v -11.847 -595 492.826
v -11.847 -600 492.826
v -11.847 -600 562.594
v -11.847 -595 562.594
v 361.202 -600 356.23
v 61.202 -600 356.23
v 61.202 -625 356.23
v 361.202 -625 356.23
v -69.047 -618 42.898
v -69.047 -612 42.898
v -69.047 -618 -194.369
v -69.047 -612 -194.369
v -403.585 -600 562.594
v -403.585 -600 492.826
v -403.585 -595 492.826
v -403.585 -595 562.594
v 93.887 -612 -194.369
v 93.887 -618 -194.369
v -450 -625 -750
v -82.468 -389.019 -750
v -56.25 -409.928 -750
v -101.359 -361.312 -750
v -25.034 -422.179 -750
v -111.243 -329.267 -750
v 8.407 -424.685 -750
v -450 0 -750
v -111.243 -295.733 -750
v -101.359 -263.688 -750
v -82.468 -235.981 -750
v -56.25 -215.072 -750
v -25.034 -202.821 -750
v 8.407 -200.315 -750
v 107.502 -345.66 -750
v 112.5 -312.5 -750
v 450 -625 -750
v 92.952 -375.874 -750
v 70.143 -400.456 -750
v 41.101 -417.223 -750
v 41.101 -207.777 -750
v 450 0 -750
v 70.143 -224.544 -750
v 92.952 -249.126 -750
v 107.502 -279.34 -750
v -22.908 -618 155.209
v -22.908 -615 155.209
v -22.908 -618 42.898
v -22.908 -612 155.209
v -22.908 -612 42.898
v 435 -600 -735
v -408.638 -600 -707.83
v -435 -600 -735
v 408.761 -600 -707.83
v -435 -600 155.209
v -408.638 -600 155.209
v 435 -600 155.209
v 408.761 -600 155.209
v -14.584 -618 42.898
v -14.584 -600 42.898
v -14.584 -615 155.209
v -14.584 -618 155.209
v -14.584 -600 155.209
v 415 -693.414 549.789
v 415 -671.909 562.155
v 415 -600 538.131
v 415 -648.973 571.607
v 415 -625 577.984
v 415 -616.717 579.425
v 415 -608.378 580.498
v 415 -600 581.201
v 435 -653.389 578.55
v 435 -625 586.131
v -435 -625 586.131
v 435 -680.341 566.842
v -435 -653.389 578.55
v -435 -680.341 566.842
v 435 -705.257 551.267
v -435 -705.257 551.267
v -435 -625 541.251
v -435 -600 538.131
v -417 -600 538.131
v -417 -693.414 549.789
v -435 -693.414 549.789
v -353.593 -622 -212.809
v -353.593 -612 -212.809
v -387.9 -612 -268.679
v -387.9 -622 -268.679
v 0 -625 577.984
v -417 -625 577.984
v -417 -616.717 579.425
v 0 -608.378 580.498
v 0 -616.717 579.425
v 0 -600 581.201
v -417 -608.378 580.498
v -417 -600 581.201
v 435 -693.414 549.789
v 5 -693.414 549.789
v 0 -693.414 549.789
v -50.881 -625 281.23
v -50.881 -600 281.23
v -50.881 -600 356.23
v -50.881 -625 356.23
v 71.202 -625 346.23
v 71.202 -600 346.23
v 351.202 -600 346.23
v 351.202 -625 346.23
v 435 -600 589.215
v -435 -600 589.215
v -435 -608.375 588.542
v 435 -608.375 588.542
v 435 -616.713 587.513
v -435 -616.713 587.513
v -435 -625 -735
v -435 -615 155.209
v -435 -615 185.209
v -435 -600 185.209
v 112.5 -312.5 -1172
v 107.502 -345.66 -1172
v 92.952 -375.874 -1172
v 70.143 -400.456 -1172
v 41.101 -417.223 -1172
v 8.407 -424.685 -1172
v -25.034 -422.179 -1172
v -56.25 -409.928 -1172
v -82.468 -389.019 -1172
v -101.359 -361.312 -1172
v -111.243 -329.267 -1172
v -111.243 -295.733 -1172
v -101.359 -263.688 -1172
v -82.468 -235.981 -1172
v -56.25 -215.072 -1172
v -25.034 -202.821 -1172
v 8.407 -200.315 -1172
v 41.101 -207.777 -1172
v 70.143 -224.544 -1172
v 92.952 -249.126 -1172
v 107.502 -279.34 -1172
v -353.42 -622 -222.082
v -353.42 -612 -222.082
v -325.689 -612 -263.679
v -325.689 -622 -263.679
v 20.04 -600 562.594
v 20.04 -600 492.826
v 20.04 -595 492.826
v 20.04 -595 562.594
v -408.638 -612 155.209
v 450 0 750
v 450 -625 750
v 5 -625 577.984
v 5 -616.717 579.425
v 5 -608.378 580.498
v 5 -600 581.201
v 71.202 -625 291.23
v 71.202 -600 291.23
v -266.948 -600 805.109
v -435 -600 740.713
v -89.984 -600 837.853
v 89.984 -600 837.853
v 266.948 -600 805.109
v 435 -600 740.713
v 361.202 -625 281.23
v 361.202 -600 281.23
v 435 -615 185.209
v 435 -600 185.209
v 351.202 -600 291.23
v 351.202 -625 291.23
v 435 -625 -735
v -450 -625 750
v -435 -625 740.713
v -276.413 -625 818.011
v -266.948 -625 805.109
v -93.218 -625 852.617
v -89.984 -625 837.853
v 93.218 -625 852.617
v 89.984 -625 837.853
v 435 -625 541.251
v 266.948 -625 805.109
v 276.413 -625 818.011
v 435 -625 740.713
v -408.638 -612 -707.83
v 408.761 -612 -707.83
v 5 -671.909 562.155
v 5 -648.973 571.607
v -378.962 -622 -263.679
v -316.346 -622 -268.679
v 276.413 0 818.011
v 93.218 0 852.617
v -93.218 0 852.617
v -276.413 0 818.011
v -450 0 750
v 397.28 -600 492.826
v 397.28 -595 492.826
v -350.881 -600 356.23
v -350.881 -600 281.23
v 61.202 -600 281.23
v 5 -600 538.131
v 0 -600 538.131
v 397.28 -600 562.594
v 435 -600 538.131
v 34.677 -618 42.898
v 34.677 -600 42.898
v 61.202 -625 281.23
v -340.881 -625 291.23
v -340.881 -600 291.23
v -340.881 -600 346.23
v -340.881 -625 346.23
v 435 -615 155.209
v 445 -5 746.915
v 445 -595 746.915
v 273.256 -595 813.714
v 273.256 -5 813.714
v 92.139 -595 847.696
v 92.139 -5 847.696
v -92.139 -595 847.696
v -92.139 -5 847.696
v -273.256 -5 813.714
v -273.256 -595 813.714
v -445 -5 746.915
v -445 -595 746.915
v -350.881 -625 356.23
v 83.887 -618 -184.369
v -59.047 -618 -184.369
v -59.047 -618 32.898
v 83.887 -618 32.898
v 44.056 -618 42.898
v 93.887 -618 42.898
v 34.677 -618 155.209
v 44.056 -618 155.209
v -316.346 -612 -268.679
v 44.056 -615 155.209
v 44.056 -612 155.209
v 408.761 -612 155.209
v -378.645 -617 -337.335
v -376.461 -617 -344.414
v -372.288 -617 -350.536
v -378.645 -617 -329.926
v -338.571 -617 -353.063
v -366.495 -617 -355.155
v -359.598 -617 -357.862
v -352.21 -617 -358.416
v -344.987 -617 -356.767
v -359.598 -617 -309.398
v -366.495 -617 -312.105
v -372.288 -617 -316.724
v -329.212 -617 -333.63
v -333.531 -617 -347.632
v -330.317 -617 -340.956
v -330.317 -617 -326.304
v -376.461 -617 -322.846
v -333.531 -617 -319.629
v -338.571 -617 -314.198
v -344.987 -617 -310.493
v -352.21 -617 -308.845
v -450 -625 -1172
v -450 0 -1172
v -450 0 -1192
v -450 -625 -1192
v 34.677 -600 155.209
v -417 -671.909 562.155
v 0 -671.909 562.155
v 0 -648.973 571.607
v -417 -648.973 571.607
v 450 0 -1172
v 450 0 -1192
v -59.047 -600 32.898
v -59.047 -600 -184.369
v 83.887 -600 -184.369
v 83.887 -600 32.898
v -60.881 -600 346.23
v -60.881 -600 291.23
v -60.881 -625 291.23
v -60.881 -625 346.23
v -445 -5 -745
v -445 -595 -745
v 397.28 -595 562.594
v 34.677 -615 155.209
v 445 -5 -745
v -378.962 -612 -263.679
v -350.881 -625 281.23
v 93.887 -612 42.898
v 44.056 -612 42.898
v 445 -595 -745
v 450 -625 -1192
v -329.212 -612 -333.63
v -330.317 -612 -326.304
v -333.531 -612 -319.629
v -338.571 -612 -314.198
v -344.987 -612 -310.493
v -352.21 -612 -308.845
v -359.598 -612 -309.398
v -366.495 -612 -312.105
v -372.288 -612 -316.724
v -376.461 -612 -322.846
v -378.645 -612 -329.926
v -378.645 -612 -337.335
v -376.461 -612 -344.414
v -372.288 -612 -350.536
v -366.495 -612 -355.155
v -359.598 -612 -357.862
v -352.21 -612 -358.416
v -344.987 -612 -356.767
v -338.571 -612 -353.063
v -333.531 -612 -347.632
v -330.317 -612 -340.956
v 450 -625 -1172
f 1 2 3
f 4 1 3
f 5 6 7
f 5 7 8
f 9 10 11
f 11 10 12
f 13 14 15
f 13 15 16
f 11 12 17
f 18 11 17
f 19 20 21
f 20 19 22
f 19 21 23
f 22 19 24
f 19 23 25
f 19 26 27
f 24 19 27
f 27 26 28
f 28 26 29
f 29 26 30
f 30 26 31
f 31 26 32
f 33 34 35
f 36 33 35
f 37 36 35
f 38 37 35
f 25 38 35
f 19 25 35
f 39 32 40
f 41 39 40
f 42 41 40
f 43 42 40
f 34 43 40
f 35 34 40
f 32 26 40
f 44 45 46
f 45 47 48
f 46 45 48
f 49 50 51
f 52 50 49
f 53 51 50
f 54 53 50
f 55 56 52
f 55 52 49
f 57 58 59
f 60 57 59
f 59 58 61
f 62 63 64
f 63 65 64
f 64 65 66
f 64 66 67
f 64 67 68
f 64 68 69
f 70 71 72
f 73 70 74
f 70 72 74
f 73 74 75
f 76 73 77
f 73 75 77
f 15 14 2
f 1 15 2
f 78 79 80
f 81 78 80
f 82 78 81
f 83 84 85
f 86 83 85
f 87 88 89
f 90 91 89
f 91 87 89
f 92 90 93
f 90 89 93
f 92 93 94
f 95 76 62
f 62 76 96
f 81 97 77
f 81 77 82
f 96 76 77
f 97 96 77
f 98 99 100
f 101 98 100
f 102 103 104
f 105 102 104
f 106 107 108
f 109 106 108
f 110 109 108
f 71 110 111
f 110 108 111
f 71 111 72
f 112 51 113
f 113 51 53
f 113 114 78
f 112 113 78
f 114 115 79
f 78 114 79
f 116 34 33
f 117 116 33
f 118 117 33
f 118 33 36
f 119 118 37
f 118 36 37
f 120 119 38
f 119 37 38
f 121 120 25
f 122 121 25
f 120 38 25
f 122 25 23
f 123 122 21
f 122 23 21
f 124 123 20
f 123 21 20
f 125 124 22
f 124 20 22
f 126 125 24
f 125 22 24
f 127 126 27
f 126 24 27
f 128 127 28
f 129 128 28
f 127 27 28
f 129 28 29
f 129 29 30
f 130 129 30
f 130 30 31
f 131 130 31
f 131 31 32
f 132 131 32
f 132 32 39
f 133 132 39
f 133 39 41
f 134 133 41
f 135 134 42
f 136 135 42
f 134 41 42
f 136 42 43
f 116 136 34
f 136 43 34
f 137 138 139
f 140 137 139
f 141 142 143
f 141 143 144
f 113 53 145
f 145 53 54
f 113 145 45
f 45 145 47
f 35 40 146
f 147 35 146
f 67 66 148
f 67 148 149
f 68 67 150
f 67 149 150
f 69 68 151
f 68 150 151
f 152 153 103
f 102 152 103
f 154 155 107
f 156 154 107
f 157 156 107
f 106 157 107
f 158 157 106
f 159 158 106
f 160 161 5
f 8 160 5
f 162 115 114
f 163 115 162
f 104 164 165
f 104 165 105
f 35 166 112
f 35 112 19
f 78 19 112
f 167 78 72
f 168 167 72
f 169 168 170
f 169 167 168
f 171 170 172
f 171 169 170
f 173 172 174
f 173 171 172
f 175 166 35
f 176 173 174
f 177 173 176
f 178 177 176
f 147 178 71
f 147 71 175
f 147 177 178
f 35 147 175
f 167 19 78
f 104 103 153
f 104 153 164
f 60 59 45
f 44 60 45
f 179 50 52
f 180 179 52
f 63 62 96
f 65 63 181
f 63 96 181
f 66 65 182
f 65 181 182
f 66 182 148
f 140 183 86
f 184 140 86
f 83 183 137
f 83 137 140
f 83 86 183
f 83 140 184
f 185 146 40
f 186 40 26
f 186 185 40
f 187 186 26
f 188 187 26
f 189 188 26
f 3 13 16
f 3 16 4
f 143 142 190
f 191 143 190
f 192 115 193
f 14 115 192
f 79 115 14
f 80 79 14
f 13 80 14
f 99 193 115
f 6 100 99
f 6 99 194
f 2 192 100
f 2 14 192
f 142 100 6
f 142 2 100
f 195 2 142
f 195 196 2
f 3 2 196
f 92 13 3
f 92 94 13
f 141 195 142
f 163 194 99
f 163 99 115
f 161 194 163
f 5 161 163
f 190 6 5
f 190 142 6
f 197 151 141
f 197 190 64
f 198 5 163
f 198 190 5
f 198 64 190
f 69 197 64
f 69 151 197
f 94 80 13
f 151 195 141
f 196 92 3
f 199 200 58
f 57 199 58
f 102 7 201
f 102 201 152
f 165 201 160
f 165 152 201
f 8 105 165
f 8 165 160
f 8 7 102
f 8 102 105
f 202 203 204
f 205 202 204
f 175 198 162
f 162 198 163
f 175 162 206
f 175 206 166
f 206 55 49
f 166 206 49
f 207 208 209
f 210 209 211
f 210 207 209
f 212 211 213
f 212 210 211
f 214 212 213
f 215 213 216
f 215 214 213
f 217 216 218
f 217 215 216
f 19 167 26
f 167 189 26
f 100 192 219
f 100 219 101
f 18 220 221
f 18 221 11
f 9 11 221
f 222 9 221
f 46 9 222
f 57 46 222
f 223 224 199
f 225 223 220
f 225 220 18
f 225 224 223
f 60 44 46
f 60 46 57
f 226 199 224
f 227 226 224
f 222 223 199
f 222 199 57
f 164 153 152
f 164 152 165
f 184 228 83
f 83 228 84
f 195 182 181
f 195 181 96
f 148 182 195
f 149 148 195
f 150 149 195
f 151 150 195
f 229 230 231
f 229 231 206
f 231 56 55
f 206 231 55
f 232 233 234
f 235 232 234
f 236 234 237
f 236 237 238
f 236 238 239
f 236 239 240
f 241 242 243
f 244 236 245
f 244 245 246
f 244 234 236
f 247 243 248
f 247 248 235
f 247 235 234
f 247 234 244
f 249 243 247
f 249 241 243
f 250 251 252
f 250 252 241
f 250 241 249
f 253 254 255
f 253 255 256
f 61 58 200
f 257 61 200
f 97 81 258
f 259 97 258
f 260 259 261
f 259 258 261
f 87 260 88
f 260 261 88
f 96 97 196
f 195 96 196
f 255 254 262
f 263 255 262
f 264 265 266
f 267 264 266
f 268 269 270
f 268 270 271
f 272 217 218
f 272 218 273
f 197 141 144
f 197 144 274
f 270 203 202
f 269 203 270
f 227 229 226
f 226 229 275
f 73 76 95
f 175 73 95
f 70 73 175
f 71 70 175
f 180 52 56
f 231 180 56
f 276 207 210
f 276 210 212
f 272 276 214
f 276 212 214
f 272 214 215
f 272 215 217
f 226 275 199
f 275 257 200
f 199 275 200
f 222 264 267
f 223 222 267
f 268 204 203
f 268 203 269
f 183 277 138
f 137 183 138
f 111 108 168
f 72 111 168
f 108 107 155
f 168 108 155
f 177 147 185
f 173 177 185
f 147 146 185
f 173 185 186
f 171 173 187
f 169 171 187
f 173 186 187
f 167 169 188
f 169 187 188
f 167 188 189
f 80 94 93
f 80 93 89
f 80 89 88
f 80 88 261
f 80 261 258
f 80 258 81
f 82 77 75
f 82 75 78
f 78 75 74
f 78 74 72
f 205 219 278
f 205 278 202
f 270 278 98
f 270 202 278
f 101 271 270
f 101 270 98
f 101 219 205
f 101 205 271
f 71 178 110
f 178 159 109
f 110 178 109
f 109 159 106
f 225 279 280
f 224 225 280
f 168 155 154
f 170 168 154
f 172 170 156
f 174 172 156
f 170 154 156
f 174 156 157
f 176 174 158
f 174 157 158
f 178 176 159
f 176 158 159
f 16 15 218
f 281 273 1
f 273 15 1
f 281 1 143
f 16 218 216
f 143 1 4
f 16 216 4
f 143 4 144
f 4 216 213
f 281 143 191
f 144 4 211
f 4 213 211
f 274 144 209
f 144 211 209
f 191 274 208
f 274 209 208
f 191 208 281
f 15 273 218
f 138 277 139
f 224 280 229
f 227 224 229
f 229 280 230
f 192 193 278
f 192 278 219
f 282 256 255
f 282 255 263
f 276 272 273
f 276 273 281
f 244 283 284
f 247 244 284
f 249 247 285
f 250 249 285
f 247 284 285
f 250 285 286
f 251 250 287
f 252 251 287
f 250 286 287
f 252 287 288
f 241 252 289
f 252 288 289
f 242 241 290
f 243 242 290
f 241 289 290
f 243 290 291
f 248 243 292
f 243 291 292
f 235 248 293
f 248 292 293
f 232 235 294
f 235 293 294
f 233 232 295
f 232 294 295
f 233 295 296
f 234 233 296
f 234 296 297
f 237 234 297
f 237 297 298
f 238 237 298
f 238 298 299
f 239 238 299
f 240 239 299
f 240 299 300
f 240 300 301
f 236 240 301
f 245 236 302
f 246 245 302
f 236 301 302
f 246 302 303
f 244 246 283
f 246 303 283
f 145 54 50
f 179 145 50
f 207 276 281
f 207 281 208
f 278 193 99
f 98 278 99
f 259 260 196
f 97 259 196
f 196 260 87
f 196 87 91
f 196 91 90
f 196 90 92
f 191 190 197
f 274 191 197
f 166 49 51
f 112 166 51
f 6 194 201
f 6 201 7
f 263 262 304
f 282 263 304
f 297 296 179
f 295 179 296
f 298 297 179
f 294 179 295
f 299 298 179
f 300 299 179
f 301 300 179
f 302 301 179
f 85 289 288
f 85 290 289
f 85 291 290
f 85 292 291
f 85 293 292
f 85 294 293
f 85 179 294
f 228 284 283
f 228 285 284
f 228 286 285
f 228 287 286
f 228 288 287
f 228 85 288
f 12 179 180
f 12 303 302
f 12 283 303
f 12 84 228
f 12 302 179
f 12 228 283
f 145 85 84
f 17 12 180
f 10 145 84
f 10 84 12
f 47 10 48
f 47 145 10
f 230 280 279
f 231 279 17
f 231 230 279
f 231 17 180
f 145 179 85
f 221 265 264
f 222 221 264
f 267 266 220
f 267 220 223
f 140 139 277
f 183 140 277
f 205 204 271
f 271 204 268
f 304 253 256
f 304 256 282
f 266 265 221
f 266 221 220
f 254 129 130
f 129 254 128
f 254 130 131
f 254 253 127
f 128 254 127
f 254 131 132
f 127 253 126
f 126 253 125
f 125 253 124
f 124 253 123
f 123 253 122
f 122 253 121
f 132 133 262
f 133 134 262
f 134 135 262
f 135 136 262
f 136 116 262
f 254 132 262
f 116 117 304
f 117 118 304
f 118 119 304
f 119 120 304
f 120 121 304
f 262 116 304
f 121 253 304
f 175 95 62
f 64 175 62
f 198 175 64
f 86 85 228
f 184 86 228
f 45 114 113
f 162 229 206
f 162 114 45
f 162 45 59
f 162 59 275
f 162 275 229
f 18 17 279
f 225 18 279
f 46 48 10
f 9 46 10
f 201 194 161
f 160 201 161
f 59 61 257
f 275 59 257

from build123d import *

# Parameters (mm, degrees)
F1_DEPTH  = 600
F2_T      = -5
F4_DEPTH  = 25
F5_W      = 300
F5_H      = 75
F5_W_2    = 280
F5_H_2    = 55
F6_DEPTH  = 25
F7_W      = 870
F7_H      = 30
F8_DEPTH  = 15
F9_W      = 142.9338163137
F9_H      = 217.2664716095
F10_DEPTH = 18
F12_DEPTH = 12
F13_R     = 24.8551421214
F14_DEPTH = 5
F16_DEPTH = 10
F18_DEPTH = 870
F20_DEPTH = 20
F22_DEPTH = 18
F25_DEPTH = 5
F27_DEPTH = 5
F28_W     = 391.7387041664
F28_H     = 69.7681009769
F28_W_2   = 377.2408955904
F29_DEPTH = 25
F30_R     = 112.5
F31_DEPTH = 422
F32_W     = 900
F32_H     = 625
F32_R     = 112.5
F33_DEPTH = 20


with BuildPart() as f1:
    # F0 (on Front) → F1 (new body)
    with BuildSketch(Plane.XZ):
        with BuildLine():
            Line((-450, -750), (450, -750))
            Line((450, -750), (450, 750))
            ThreePointArc((450, 750), (0, 856.9714450254), (-450, 750))
            Line((-450, 750), (-450, -750))
        make_face()
    extrude(amount=F1_DEPTH)

    # F2
    f2_openings = [f1.faces().sort_by_distance(p)[0] for p in [
        (0, 0, 36.375009),
    ]]
    offset(amount=F2_T, openings=f2_openings)

    # F3 (on face) → F4 (join)
    with BuildSketch(Plane.XZ.offset(600)):
        with BuildLine():
            Line((450, -750), (450, 750))
            ThreePointArc((450, 750), (0, 856.9714450254), (-450, 750))
            Line((-450, 750), (-450, -750))
            Line((-450, -750), (450, -750))
        make_face()
        with BuildLine():
            Line((435, 740.7134888368), (435, -735))
            Line((435, -735), (-435, -735))
            Line((-435, -735), (-435, 740.7134888368))
            ThreePointArc((-435, 740.7134888368), (0, 841.9714450254), (435, 740.7134888368))
        make_face(mode=Mode.SUBTRACT)
    extrude(amount=F4_DEPTH)

    # F5 (on face) → F6 (join)
    with BuildSketch(Plane.XZ.offset(600)):
        with Locations((-200.8810852704, 318.7295198674)):
            Rectangle(F5_W, F5_H)
        with Locations((-200.8810852704, 318.7295198674)):
            Rectangle(F5_W_2, F5_H_2, mode=Mode.SUBTRACT)
        with Locations((211.2015885351, 318.7295198674)):
            Rectangle(F5_W, F5_H)
        with Locations((211.2015885351, 318.7295198674)):
            Rectangle(F5_W_2, F5_H_2, mode=Mode.SUBTRACT)
    extrude(amount=F6_DEPTH)

    # F7 (on face) → F8 (join)
    with BuildSketch(Plane.XZ.offset(600)):
        with Locations((0, 170.2089005709)):
            Rectangle(F7_W, F7_H)
    extrude(amount=F8_DEPTH)

    # F9 (on face) → F10 (join)
    with BuildSketch(Plane.XZ.offset(600)):
        Polygon((-14.5836101339, 155.2089005709), (-22.9078065604, 155.2089005709), (-22.9078065604, 42.8976975381), (-69.0468810499, 42.8976975381), (-69.0468810499, -194.3687740713), (93.8869352639, -194.3687740713), (93.8869352639, 42.8976975381), (44.0564386487, 42.8976975381), (44.0564386487, 155.2089005709), (34.6765947954, 155.2089005709), (34.6765947954, 42.8976975381), (-14.5836101339, 42.8976975381), align=None)
        with Locations((12.420027107, -75.7355382666)):
            Rectangle(F9_W, F9_H, mode=Mode.SUBTRACT)
    extrude(amount=F10_DEPTH)

    # F11 (on face) → F12 (join)
    with BuildSketch(Plane.XZ.offset(600)):
        Polygon((-22.9078065604, 155.2089005709), (-408.6377620697, 155.2089005709), (-408.6377620697, -707.8300118446), (408.7606370449, -707.8300118446), (408.7606370449, 155.2089005709), (44.0564386487, 155.2089005709), (44.0564386487, 42.8976975381), (93.8869352639, 42.8976975381), (93.8869352639, -194.3687740713), (-69.0468810499, -194.3687740713), (-69.0468810499, 42.8976975381), (-22.9078065604, 42.8976975381), align=None)
    extrude(amount=F12_DEPTH)

    # F13 (on face) → F14 (join)
    with BuildSketch(Plane.XZ.offset(612)):
        with Locations((-354.0675938129, -333.6301445961)):
            Circle(F13_R)
    extrude(amount=F14_DEPTH)

    # F15 (on face) → F16 (join)
    with BuildSketch(Plane.XZ.offset(612)):
        Polygon((-387.899610247, -268.6794745922), (-316.3461361468, -268.6794745922), (-353.5931451269, -212.8089411077), align=None)
        Polygon((-378.9620697498, -263.6794745922), (-353.4200489521, -222.0824658871), (-325.6887197495, -263.6794745922), align=None, mode=Mode.SUBTRACT)
    extrude(amount=F16_DEPTH)

    # F17 (on face) → F18 (join, through all)
    with BuildSketch(Plane.YZ.offset(-435)):
        with BuildLine():
            Line((-625, 577.9839080805), (-625, 586.1312416531))
            ThreePointArc((-625, 586.1312416531), (-667.0829642918, 573.1979535583), (-705.2572369576, 551.2669086456))
            Line((-705.2572369576, 551.2669086456), (-693.4141296704, 549.7889105873))
            ThreePointArc((-693.4141296704, 549.7889105873), (-660.5960632562, 567.2567631744), (-625, 577.9839080805))
        make_face()
        with BuildLine():
            Line((-600, 581.2005341429), (-600, 589.2150402069))
            ThreePointArc((-600, 589.2150402069), (-612.5491949312, 588.0719585758), (-625, 586.1312416531))
            Line((-625, 586.1312416531), (-625, 577.9839080805))
            ThreePointArc((-625, 577.9839080805), (-612.5535193278, 580.008179687), (-600, 581.2005341429))
        make_face()
    extrude(amount=F18_DEPTH)

    # F19 (on face) → F20 (join)
    with BuildSketch(Plane.YZ.offset(435)):
        with BuildLine():
            ThreePointArc((-625, 577.9839080805), (-660.5960632562, 567.2567631744), (-693.4141296704, 549.7889105873))
            Line((-693.4141296704, 549.7889105873), (-600, 538.1309986115))
            Line((-600, 538.1309986115), (-600, 589.2150402069))
            ThreePointArc((-600, 589.2150402069), (-612.5491949312, 588.0719585758), (-625, 586.1312416531))
            Line((-625, 586.1312416531), (-625, 577.9839080805))
        make_face()
        with BuildLine():
            ThreePointArc((-625, 586.1312416531), (-667.0829642918, 573.1979535583), (-705.2572369576, 551.2669086456))
            Line((-705.2572369576, 551.2669086456), (-693.4141296704, 549.7889105873))
            ThreePointArc((-693.4141296704, 549.7889105873), (-660.5960632562, 567.2567631744), (-625, 577.9839080805))
            Line((-625, 577.9839080805), (-625, 586.1312416531))
        make_face()
    extrude(amount=-F20_DEPTH)

    # F21 (on face) → F22 (join)
    with BuildSketch(Plane(origin=(-435, 0, 0), x_dir=(0, -1, 0), z_dir=(-1, 0, 0))):
        with BuildLine():
            ThreePointArc((625, 577.9839080805), (660.5960632562, 567.2567631744), (693.4141296704, 549.7889105873))
            Line((693.4141296704, 549.7889105873), (705.2572369576, 551.2669086456))
            ThreePointArc((705.2572369576, 551.2669086456), (667.0829642918, 573.1979535583), (625, 586.1312416531))
            Line((625, 586.1312416531), (625, 577.9839080805))
        make_face()
        with BuildLine():
            Line((600, 589.2150402069), (600, 581.2005341429))
            Line((600, 581.2005341429), (600, 538.1309986115))
            Line((600, 538.1309986115), (693.4141296704, 549.7889105873))
            ThreePointArc((693.4141296704, 549.7889105873), (660.5960632562, 567.2567631744), (625, 577.9839080805))
            Line((625, 577.9839080805), (625, 586.1312416531))
            ThreePointArc((625, 586.1312416531), (612.5491949312, 588.0719585758), (600, 589.2150402069))
        make_face()
    extrude(amount=-F22_DEPTH)

    # F24 (on offset) → F25 (join)
    with BuildSketch(Plane.YZ):
        with BuildLine():
            Line((-600, 538.1309986115), (-600, 581.2005341429))
            ThreePointArc((-600, 581.2005341429), (-648.7839740291, 571.6711832668), (-693.4141296704, 549.7889105873))
            Line((-693.4141296704, 549.7889105873), (-600, 538.1309986115))
        make_face()
    extrude(amount=F25_DEPTH)

    # F26 (on face) → F27 (join)
    with BuildSketch(Plane(origin=(0, 0, 0), x_dir=(-1, 0, 0), z_dir=(0, 1, 0))):
        with BuildLine():
            ThreePointArc((445, 746.9152634769), (0, 851.9714450254), (-445, 746.9152634769))
            Line((-445, 746.9152634769), (-445, -745))
            Line((-445, -745), (445, -745))
            Line((445, -745), (445, 746.9152634769))
        make_face()
    extrude(amount=-F27_DEPTH)

    # F28 (on face) → F29 (cut)
    with BuildSketch(Plane.XZ.offset(600)):
        with Locations((-207.7159030628, 527.7101248503)):
            Rectangle(F28_W, F28_H)
        with Locations((208.6599989108, 527.7101248503)):
            Rectangle(F28_W_2, F28_H)
    extrude(amount=-F29_DEPTH, mode=Mode.SUBTRACT)

    # F30 (on face) → F31 (join)
    with BuildSketch(Plane(origin=(0, 0, -750), x_dir=(1, 0, 0), z_dir=(0, 0, -1))):
        with Locations((0, 312.5)):
            Circle(F30_R)
    extrude(amount=F31_DEPTH)

    # F32 (on face) → F33 (join)
    with BuildSketch(Plane(origin=(0, 0, -1172), x_dir=(1, 0, 0), z_dir=(0, 0, -1))):
        with Locations((0, 312.5)):
            Rectangle(F32_W, F32_H)
        with Locations((0, 312.5)):
            Circle(F32_R, mode=Mode.SUBTRACT)
        with Locations((0, 312.5)):
            Circle(F32_R)
    extrude(amount=F33_DEPTH)


solid = f1.part
